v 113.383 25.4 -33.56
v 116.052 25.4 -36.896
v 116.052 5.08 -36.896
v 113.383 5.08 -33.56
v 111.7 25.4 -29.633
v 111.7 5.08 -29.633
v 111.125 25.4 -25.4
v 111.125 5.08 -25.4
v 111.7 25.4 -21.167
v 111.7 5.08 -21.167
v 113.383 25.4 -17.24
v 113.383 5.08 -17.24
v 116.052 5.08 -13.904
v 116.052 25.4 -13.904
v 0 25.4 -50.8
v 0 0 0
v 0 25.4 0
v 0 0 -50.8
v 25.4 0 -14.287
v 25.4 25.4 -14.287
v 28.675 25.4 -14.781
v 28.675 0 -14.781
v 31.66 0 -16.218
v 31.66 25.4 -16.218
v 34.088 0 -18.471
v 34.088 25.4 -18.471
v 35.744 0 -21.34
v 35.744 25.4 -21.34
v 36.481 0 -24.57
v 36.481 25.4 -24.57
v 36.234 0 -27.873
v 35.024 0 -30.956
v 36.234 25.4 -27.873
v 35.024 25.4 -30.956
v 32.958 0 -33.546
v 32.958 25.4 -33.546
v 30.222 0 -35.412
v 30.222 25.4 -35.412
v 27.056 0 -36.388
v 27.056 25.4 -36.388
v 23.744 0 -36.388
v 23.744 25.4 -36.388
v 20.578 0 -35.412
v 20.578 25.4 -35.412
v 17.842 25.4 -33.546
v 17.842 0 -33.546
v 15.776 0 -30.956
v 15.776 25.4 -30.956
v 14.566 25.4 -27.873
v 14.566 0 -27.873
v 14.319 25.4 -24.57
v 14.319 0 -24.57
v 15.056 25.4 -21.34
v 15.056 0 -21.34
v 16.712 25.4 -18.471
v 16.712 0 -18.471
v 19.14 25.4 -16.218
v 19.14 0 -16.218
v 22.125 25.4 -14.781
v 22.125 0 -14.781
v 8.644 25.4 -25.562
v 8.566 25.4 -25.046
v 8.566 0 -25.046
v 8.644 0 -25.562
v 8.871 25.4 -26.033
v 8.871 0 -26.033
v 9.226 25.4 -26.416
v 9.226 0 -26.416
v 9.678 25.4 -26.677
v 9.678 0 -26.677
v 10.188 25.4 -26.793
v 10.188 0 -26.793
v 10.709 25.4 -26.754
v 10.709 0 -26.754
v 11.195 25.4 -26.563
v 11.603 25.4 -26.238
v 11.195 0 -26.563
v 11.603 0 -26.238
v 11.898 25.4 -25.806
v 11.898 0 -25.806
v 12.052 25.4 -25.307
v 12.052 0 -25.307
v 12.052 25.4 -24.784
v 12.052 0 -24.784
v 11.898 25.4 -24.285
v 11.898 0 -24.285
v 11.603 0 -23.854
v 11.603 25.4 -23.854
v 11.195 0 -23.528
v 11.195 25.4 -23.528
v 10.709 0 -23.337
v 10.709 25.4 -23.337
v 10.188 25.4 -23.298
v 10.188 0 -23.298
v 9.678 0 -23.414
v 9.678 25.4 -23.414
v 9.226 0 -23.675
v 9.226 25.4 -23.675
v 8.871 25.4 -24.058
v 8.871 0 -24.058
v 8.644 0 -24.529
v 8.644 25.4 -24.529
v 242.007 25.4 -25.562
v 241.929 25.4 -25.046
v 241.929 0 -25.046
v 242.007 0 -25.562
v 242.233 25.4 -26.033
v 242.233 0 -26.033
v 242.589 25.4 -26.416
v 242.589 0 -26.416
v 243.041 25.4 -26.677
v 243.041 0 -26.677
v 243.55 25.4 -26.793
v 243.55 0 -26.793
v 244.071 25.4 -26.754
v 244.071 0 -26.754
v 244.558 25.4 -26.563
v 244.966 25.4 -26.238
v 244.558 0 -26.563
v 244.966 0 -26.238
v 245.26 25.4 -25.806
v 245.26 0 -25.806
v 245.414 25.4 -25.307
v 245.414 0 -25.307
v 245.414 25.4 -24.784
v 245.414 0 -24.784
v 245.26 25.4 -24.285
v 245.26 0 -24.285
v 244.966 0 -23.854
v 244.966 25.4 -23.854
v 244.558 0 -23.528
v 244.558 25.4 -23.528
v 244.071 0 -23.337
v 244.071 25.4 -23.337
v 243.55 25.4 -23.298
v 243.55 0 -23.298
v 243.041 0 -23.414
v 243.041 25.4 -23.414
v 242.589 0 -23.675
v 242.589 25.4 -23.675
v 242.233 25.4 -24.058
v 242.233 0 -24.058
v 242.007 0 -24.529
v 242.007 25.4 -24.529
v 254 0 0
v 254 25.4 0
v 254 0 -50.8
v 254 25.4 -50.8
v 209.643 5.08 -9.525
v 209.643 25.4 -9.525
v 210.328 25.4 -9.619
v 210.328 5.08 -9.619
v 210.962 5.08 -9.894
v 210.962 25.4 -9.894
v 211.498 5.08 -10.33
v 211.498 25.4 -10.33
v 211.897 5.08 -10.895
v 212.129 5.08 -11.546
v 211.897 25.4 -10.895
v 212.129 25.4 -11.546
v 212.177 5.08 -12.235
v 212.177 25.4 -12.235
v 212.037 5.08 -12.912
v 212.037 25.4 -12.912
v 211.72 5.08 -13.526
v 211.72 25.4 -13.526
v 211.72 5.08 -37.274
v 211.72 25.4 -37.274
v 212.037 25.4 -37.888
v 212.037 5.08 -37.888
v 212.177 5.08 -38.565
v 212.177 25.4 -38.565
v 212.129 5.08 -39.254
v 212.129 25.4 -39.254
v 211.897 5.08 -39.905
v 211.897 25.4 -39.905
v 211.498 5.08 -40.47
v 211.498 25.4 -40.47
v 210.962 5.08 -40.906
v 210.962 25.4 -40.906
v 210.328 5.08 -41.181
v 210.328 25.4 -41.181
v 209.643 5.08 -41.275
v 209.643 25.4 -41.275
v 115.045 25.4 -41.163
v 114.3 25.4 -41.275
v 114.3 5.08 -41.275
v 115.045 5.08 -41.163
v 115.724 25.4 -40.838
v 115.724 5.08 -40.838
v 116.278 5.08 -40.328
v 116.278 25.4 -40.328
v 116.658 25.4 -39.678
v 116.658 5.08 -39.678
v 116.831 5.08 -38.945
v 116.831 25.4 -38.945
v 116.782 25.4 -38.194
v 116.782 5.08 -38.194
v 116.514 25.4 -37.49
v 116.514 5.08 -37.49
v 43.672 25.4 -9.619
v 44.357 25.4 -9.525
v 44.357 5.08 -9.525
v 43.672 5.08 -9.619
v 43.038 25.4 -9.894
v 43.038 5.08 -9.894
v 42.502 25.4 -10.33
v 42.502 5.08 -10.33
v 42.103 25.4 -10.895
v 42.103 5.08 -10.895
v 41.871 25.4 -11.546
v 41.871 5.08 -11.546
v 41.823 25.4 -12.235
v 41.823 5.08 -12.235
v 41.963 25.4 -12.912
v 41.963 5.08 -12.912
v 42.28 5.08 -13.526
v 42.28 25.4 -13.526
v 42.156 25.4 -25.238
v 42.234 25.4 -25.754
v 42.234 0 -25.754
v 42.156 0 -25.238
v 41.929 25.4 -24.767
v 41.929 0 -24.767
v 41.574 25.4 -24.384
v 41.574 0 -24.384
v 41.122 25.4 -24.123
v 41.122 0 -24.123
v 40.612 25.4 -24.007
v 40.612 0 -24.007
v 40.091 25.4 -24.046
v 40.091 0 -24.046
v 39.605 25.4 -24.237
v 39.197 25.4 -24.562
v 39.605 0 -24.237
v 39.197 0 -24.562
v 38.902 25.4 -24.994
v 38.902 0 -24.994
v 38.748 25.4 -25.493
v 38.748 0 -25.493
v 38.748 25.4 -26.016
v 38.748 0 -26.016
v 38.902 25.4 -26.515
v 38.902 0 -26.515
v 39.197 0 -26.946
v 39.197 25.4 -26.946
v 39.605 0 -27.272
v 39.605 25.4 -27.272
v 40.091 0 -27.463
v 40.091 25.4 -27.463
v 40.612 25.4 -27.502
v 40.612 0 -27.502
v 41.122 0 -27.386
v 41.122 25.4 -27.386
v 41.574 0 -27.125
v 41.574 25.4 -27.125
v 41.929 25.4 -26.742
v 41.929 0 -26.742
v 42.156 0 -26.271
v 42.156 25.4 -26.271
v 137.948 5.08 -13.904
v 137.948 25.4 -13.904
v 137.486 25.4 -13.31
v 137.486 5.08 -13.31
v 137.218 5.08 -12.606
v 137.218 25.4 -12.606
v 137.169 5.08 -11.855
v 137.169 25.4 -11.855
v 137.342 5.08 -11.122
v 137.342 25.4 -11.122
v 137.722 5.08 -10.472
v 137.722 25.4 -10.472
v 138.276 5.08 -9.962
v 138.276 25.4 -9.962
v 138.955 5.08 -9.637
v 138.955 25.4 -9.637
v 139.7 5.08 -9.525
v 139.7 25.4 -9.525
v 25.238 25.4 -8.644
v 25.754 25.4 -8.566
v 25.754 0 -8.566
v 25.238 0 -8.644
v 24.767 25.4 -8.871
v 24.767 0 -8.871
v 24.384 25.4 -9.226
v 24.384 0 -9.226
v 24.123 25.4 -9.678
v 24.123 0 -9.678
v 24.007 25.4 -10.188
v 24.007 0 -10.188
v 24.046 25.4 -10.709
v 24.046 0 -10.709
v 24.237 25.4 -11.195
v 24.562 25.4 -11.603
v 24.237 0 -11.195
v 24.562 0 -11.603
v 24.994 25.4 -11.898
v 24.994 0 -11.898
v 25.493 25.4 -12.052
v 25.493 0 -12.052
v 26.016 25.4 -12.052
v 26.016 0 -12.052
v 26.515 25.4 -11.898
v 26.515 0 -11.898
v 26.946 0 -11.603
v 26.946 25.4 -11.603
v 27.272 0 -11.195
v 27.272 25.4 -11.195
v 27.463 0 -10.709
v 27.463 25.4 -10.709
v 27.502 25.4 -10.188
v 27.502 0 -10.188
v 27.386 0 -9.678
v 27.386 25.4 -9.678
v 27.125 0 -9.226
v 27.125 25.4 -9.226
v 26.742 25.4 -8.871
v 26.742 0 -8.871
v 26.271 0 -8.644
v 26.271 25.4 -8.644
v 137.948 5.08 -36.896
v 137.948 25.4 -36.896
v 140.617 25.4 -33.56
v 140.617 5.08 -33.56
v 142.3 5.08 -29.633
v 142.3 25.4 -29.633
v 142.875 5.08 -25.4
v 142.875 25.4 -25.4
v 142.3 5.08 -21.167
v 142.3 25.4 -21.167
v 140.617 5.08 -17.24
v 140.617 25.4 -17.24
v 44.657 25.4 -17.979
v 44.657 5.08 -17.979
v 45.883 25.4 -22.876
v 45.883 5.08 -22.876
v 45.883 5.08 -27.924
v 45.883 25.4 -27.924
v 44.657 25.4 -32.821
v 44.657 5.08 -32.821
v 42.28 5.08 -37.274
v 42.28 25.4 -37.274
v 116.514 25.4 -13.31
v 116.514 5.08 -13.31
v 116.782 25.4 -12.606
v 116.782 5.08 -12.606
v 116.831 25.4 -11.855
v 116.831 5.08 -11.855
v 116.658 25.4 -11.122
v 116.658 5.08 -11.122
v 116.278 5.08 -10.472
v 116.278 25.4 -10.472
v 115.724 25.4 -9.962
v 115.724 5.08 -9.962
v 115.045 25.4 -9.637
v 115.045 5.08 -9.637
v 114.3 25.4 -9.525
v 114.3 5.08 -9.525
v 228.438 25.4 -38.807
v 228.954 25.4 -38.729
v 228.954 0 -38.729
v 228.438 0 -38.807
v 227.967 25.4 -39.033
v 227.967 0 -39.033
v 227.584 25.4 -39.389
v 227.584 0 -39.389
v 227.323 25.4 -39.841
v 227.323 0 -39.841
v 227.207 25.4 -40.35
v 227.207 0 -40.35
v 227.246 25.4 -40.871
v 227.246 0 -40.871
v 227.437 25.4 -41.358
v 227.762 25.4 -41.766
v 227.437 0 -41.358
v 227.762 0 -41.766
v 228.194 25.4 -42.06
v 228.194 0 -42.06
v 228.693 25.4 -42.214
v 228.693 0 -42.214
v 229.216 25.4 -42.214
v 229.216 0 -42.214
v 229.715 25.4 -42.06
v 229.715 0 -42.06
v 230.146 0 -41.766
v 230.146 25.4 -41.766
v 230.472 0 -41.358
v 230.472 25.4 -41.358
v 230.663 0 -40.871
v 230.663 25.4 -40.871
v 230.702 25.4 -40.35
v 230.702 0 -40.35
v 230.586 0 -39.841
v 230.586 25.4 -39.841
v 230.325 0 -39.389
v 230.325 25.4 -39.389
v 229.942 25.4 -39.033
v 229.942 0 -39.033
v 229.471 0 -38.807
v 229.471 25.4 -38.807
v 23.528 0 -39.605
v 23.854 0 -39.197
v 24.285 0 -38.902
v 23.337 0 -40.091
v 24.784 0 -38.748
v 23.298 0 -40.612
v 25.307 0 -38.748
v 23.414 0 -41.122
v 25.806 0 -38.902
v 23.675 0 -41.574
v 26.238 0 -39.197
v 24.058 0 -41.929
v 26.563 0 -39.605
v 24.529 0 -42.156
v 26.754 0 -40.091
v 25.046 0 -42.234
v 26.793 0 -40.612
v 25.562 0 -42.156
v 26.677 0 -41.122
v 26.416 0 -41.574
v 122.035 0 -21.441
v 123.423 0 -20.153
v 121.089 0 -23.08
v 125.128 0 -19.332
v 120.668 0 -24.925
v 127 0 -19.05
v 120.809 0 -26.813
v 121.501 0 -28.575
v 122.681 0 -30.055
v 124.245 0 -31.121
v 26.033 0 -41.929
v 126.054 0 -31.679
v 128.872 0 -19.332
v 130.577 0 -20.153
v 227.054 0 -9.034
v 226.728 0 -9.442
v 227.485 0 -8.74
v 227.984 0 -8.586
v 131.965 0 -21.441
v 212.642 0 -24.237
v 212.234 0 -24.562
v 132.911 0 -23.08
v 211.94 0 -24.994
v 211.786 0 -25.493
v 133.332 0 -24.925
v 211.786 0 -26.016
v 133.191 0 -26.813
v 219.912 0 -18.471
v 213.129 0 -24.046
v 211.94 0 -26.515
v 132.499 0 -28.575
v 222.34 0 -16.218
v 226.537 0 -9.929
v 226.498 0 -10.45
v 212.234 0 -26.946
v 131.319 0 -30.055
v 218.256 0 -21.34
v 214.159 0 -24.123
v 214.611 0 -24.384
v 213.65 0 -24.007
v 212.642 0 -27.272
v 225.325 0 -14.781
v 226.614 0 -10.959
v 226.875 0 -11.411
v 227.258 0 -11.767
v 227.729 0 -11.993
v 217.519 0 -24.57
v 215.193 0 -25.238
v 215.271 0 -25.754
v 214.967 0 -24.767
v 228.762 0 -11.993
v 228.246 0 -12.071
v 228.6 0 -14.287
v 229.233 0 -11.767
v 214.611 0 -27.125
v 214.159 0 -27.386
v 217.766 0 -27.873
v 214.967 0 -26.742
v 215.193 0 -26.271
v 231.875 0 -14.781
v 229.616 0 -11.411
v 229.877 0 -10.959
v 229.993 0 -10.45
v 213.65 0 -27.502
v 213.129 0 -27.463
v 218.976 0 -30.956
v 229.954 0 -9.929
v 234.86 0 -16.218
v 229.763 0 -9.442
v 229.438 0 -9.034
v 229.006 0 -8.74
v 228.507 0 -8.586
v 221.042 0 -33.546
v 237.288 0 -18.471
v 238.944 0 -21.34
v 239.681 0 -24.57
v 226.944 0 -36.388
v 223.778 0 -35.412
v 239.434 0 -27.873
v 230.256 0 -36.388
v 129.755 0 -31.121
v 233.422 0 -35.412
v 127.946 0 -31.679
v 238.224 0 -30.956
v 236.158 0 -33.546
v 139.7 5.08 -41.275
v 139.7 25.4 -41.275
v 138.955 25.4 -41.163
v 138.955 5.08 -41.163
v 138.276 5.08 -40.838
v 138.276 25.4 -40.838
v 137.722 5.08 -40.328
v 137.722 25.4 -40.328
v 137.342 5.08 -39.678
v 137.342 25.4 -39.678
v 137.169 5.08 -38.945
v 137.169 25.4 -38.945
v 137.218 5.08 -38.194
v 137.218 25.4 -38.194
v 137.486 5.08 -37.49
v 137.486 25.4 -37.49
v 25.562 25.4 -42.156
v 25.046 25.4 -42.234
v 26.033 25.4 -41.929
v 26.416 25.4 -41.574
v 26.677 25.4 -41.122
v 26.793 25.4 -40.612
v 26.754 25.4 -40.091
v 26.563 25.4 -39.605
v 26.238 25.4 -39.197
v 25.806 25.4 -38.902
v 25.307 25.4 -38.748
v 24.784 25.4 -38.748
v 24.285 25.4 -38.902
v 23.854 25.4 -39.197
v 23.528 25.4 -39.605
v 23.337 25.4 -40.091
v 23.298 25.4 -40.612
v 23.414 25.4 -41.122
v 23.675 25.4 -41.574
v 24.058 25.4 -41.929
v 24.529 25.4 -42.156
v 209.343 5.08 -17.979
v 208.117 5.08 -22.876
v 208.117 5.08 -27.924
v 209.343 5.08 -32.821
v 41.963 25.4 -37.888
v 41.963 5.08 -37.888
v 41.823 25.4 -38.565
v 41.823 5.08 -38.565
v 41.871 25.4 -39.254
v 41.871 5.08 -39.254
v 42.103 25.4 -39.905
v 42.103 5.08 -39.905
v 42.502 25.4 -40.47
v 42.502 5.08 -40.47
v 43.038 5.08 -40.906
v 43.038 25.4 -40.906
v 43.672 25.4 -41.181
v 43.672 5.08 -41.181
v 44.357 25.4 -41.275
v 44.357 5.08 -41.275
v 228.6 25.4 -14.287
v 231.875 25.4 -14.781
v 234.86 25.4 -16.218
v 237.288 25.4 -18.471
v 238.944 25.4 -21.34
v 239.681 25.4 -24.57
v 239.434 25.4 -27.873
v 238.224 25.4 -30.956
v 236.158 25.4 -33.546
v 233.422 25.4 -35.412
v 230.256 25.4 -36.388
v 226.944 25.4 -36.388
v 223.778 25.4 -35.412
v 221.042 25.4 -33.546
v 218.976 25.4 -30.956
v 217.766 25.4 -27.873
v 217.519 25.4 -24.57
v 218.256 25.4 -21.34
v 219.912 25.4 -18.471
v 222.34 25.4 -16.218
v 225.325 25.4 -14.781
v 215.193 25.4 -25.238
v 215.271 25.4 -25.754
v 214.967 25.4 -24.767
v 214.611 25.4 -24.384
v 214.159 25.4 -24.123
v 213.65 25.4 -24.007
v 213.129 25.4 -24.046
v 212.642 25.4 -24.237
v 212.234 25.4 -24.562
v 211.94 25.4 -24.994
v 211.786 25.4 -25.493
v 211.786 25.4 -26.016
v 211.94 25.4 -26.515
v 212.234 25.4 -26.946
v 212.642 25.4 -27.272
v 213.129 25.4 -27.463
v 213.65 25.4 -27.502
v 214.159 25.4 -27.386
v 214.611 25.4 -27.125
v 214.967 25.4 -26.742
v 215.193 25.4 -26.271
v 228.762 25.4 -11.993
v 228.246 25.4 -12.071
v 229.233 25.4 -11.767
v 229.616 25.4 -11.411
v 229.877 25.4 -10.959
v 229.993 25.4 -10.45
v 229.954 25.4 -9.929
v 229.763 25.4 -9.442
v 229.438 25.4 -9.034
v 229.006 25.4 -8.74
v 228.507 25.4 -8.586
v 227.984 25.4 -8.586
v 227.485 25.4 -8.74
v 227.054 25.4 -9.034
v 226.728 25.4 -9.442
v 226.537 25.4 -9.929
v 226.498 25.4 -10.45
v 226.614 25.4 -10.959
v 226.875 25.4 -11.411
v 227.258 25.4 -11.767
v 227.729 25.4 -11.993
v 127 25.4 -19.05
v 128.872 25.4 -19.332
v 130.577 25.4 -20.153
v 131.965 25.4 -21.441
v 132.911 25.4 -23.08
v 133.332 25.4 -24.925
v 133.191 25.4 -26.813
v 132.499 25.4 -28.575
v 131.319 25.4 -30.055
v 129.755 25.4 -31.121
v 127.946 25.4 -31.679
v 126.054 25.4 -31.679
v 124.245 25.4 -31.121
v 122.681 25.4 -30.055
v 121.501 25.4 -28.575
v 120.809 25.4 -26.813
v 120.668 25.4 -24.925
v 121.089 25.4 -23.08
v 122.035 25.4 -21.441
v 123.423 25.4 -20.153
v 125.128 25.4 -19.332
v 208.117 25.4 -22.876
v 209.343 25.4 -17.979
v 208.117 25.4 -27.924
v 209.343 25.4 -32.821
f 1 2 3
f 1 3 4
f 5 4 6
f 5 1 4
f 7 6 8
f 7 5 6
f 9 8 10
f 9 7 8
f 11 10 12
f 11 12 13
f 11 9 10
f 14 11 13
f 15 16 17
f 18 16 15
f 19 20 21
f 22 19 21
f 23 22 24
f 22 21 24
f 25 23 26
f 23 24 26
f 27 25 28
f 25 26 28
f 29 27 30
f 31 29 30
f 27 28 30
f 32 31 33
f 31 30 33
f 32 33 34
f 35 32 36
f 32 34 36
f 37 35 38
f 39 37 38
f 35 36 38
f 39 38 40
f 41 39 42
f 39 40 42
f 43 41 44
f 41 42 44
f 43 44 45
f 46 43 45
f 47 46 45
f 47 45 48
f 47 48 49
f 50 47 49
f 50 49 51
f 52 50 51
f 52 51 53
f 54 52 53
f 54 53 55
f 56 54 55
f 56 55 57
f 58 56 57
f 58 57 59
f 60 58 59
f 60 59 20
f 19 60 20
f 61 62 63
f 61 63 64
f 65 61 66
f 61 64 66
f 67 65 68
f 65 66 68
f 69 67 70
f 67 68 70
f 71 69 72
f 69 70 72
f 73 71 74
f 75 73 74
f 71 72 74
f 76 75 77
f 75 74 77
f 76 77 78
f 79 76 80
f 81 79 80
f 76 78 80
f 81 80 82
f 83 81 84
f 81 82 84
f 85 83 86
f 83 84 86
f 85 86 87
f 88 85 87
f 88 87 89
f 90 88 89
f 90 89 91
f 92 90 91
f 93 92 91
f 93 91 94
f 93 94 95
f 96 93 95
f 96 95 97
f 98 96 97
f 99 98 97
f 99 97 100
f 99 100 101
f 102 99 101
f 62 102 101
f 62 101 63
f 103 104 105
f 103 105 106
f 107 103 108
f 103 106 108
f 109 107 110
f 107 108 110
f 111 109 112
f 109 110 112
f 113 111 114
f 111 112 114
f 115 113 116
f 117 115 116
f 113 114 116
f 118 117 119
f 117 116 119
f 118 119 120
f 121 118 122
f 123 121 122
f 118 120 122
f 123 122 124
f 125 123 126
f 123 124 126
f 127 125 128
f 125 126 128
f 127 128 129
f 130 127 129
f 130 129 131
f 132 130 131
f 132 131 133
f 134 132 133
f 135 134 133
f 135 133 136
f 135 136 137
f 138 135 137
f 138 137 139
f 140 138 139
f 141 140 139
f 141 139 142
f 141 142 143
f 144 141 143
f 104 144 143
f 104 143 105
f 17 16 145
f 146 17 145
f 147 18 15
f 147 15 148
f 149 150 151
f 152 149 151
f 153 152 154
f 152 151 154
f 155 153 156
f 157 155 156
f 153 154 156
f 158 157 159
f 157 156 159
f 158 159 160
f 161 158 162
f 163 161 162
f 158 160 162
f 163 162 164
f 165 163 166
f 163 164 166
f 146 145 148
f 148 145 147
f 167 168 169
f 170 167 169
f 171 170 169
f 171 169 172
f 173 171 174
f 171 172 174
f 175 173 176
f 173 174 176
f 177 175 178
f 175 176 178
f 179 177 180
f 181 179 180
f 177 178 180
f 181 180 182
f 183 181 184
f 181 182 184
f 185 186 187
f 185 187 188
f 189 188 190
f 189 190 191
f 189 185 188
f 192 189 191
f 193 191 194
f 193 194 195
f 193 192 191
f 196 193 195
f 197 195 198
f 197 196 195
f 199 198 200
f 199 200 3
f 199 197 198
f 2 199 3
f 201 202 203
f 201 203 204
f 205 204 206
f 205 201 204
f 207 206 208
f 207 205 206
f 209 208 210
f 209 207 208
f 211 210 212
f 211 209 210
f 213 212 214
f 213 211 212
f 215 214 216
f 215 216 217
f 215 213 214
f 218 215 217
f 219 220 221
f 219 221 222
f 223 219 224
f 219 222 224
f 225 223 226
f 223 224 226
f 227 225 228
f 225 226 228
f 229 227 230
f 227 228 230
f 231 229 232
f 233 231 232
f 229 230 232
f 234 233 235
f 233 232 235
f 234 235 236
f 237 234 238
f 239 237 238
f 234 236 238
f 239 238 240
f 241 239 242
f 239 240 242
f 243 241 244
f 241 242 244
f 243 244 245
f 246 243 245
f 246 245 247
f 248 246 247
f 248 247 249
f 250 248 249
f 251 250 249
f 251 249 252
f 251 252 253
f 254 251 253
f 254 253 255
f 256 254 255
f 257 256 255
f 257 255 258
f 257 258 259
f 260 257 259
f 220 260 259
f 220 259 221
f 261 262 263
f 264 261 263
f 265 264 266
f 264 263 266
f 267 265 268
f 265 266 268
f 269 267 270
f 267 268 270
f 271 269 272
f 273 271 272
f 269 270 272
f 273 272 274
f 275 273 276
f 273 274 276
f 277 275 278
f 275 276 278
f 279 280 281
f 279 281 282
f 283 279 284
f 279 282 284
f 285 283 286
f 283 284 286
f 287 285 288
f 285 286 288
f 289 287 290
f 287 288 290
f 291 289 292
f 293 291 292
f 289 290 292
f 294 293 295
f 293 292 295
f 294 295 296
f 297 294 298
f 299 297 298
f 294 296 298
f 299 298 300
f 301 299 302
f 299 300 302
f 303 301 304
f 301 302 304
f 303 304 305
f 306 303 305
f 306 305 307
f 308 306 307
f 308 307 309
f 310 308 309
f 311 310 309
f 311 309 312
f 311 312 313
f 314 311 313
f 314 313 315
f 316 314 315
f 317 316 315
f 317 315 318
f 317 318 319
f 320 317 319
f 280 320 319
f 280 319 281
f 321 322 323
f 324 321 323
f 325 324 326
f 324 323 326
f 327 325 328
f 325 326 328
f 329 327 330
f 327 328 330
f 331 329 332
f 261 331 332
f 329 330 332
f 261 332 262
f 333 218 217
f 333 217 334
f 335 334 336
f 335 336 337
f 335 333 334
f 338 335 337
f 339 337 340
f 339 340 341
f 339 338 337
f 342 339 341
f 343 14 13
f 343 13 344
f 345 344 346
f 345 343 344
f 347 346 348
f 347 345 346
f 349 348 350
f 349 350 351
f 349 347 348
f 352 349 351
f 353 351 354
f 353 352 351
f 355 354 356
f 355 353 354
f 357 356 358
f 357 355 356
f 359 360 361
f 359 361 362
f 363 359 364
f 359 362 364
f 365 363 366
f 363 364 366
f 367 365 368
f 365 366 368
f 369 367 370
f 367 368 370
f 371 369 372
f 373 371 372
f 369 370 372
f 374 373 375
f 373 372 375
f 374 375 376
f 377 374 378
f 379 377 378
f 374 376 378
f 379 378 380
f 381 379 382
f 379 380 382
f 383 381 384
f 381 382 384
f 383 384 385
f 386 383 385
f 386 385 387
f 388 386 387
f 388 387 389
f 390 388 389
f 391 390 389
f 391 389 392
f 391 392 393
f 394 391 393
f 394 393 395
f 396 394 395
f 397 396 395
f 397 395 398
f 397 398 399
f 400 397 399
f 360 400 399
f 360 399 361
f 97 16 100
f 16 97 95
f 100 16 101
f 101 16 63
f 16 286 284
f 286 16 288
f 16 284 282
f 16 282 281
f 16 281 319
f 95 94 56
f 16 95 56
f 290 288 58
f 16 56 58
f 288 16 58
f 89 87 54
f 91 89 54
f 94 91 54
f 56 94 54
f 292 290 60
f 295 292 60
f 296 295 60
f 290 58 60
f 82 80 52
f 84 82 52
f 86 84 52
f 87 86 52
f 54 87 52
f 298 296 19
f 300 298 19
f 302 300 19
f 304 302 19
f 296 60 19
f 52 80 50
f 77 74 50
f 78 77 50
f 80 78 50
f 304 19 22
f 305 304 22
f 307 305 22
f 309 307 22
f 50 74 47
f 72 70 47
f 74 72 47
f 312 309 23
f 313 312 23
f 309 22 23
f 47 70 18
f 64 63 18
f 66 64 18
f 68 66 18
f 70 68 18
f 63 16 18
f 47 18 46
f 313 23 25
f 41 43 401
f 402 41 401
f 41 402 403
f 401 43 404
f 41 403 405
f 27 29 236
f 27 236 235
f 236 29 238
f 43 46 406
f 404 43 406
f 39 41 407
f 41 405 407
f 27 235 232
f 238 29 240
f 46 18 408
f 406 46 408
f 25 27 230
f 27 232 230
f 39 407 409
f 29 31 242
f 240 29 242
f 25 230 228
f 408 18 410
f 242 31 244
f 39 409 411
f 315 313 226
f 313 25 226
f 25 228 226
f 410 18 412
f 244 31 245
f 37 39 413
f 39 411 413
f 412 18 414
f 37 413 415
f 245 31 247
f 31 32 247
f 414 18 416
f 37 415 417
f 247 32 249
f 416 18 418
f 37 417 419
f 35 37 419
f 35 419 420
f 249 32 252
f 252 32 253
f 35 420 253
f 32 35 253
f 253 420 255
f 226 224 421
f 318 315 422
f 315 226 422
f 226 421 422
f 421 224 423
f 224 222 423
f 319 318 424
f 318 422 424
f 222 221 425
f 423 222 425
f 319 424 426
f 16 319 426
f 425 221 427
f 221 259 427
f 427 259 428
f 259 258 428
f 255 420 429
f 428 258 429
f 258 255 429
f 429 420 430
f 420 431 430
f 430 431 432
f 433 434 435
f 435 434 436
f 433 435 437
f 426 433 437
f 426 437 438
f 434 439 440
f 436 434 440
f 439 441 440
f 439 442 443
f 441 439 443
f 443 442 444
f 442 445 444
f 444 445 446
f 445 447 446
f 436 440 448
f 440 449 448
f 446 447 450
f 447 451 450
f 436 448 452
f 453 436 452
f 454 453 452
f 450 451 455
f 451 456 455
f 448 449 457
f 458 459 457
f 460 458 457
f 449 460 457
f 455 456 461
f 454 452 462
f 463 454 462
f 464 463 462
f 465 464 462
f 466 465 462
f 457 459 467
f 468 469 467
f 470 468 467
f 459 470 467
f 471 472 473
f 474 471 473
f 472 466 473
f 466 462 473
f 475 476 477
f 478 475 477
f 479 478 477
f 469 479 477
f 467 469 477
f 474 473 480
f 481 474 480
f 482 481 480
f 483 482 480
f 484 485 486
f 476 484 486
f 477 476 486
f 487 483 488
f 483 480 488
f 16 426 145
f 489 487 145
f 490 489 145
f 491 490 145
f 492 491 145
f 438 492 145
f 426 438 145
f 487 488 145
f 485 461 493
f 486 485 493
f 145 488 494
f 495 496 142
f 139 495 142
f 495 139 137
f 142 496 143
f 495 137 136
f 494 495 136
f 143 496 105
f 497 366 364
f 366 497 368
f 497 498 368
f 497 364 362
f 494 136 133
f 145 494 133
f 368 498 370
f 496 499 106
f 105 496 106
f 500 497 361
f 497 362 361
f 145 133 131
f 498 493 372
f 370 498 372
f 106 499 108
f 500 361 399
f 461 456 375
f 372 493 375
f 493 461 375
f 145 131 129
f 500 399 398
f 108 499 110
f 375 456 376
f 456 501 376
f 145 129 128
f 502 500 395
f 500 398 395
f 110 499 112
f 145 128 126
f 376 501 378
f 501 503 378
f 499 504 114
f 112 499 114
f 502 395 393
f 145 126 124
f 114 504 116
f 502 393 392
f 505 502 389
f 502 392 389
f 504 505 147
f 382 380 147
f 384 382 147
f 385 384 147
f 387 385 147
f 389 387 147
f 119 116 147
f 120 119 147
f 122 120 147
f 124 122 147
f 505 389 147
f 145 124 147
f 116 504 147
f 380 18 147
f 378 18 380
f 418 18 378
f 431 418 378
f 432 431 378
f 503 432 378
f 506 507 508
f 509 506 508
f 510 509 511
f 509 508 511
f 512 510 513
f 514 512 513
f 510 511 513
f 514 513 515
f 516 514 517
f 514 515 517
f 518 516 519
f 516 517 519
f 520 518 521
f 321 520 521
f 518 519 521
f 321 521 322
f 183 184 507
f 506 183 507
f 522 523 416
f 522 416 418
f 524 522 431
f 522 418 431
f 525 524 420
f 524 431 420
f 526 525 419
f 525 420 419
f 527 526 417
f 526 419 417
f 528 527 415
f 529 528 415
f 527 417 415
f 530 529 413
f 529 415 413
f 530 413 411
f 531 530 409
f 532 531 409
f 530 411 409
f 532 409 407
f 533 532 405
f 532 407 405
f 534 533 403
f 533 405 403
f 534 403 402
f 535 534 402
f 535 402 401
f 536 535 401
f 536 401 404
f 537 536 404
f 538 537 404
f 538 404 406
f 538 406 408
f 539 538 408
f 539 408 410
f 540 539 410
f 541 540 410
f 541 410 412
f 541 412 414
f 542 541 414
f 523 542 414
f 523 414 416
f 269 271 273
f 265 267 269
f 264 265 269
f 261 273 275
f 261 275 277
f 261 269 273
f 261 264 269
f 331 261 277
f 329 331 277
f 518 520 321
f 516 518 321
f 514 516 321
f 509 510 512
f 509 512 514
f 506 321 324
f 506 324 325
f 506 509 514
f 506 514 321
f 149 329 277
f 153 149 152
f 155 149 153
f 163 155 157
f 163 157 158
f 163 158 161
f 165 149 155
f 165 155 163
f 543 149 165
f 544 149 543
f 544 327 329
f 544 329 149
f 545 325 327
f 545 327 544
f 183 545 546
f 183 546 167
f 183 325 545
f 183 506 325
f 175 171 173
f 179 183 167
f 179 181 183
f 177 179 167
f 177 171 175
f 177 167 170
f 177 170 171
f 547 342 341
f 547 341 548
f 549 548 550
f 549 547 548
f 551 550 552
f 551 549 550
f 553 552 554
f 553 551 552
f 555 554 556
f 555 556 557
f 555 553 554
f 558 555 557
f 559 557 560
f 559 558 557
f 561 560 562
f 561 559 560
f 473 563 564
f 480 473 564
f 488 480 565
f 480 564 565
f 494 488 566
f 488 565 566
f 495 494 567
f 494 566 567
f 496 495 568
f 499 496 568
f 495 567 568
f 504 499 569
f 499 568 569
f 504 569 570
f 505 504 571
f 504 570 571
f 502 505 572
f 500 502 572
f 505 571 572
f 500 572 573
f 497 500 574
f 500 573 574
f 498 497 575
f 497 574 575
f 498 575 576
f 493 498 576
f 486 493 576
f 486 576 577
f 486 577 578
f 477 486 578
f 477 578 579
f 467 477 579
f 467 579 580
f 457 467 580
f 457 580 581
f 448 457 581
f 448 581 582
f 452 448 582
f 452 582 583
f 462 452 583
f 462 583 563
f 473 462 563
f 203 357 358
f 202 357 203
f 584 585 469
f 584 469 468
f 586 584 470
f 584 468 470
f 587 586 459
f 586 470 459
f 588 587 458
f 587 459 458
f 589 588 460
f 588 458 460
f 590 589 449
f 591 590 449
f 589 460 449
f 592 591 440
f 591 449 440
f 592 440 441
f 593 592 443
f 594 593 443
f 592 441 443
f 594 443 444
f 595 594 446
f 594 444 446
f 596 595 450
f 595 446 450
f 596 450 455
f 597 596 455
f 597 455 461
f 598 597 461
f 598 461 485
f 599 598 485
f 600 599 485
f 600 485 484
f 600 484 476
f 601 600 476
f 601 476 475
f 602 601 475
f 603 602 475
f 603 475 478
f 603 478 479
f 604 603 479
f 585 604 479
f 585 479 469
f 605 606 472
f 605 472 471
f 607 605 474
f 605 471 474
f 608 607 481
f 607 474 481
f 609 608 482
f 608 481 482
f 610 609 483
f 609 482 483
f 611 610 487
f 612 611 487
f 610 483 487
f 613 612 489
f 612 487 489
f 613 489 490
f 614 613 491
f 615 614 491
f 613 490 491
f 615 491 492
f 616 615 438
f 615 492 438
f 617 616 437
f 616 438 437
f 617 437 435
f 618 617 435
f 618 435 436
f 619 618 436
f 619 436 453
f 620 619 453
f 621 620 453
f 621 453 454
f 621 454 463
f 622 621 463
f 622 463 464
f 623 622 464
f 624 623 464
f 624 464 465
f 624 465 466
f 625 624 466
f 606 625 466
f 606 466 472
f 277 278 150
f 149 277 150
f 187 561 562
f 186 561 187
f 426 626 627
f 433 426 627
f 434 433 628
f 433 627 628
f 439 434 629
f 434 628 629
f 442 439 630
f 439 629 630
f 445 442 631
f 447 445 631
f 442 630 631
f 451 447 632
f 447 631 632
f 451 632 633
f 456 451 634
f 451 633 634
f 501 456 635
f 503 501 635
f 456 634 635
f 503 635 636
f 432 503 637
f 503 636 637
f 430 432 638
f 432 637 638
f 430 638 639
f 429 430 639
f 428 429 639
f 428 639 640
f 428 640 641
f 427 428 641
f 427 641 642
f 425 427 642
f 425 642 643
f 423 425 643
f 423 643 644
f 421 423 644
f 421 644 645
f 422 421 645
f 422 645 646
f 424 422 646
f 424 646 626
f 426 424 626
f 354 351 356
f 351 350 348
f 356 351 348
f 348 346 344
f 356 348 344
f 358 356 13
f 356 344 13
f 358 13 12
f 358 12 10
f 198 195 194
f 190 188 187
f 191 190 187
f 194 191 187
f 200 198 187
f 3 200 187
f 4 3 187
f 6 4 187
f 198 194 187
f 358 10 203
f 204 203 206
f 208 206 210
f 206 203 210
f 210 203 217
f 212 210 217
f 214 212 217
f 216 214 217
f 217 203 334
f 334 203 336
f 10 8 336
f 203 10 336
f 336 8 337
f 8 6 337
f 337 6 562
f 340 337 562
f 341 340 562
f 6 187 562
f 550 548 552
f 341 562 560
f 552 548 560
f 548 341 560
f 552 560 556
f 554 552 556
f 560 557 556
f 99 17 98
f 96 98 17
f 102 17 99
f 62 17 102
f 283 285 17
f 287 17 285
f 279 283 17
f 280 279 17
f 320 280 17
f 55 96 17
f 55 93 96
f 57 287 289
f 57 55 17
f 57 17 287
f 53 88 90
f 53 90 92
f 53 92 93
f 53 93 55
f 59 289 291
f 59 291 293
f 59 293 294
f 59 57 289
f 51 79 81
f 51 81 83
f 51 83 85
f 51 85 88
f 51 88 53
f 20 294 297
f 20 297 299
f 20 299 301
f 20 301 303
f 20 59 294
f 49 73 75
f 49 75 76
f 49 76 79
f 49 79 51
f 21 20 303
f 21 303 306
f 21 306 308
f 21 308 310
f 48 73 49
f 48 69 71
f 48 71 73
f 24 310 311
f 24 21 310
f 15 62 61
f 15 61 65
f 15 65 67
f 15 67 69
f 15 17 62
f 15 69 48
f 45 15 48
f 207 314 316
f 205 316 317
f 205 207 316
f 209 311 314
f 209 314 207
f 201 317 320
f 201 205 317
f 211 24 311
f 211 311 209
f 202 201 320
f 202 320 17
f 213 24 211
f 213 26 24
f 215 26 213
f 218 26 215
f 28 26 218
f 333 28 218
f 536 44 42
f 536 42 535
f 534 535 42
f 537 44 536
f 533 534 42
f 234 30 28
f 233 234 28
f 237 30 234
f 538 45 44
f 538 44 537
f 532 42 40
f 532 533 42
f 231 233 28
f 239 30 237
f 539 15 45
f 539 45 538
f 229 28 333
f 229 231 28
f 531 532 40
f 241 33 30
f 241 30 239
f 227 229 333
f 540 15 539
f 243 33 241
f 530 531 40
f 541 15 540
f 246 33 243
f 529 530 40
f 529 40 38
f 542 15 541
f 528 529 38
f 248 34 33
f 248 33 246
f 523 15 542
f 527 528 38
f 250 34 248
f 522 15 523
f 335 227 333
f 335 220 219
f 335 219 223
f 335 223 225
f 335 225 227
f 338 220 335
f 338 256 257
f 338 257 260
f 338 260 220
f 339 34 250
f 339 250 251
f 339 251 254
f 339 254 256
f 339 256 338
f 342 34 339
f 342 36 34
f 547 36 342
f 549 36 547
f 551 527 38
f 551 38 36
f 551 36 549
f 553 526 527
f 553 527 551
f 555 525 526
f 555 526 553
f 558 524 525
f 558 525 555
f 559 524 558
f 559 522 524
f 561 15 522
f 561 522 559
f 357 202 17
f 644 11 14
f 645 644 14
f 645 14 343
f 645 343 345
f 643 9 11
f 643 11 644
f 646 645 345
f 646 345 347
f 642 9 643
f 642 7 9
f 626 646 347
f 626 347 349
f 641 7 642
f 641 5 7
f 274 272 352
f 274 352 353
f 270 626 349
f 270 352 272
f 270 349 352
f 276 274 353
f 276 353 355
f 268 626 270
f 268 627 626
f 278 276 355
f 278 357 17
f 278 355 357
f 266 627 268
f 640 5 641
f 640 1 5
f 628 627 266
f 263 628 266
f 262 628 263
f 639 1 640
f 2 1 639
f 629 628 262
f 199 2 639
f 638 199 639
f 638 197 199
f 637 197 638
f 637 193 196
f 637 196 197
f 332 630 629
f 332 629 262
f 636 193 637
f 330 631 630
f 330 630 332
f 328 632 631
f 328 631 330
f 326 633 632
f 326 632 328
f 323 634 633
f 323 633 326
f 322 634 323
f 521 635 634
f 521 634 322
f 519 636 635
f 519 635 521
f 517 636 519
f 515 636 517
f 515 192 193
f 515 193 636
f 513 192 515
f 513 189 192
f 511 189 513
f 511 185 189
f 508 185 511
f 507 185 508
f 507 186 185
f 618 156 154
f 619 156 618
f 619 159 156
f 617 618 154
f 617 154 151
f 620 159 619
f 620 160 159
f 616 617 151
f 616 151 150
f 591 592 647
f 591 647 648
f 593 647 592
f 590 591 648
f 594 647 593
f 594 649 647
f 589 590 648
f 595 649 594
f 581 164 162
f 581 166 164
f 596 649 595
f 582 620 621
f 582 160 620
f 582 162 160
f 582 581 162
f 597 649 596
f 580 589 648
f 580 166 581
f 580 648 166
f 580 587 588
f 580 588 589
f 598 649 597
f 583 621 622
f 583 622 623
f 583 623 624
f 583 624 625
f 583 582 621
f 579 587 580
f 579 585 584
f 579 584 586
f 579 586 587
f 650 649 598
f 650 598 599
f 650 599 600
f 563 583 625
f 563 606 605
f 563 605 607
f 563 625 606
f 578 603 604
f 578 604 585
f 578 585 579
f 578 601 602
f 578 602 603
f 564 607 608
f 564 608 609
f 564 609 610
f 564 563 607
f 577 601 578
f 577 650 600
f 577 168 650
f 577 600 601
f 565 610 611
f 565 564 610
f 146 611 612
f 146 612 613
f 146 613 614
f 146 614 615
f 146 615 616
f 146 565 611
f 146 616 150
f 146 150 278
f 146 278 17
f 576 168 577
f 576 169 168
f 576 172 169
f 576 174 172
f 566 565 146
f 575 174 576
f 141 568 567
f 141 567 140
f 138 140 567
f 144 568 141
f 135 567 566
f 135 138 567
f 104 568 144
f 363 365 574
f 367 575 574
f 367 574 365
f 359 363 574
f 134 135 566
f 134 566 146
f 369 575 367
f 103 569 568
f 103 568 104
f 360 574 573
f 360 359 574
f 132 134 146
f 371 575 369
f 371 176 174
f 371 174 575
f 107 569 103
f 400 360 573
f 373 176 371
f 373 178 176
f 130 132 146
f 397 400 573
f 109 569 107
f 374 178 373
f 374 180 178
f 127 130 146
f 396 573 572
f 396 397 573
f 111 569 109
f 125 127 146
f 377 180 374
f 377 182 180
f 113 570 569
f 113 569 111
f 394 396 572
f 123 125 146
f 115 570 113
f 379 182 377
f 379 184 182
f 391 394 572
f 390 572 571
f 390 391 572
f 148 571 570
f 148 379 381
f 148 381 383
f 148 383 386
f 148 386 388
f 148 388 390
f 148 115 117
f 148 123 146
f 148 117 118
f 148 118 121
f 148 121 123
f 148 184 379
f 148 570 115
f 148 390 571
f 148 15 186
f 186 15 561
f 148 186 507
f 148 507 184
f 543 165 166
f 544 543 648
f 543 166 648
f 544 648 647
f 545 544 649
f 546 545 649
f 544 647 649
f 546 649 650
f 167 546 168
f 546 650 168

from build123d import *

# Parameters (mm, degrees)
SKETCH2_W             = 254
SKETCH2_H             = 50.8
BOSS_EXTRUDE1_DEPTH   = 25.4
SKETCH3_R             = 11.1125
SKETCH3_R_2           = 6.35
CUT_EXTRUDE1_DEPTH    = 261.272549455
F_6_32_TAPPED_HOLE1_D = 3.5052
CUT_EXTRUDE3_DEPTH    = 20.32
CIRPATTERN1_COUNT     = 4
CIRPATTERN2_COUNT     = 4


with BuildPart() as part:
    # Sketch2 → Boss-Extrude1 (new body)
    with BuildSketch(Plane(origin=(0, 0, 0), x_dir=(1, 0, 0), z_dir=(0, 1, 0))):
        with Locations((127, 25.4)):
            Rectangle(SKETCH2_W, SKETCH2_H)
    extrude(amount=BOSS_EXTRUDE1_DEPTH)

    # Sketch3 → Cut-Extrude1 (cut, through all)
    with BuildSketch(Plane(origin=(0, 25.4, 0), x_dir=(1, 0, 0), z_dir=(0, 1, 0))):
        with Locations(Location((25.4, 25.4, 0), (0, 0, 270))):
            Circle(SKETCH3_R)
        with Locations(Location((228.6, 25.4, 0), (0, 0, 270))):
            Circle(SKETCH3_R)
        with Locations(Location((127, 25.4, 0), (0, 0, 270))):
            Circle(SKETCH3_R_2)
    extrude(amount=-CUT_EXTRUDE1_DEPTH, mode=Mode.SUBTRACT)

    # #6-32 Tapped Hole1 (through all)
    with Locations(Plane(origin=(0, 25.4, 0), x_dir=(1, 0, 0), z_dir=(0, 1, 0))):
        with Locations((10.31875, 25.045657608), (243.68125, 25.045657608)):
            f_6_32_tapped_hole1 = Hole(F_6_32_TAPPED_HOLE1_D / 2)

    # Sketch6 → Cut-Extrude3 (cut)
    with BuildSketch(Plane(origin=(0, 25.4, 0), x_dir=(1, 0, 0), z_dir=(0, 1, 0))):
        with BuildLine():
            Line((44.357169653, 41.275), (114.3, 41.275))
            ThreePointArc((114.3, 41.275), (116.658330795, 39.678332318), (116.051724138, 36.895689655))
            ThreePointArc((116.051724138, 36.895689655), (111.125, 25.4), (116.051724138, 13.904310345))
            ThreePointArc((116.051724138, 13.904310345), (116.658330795, 11.121667682), (114.3, 9.525))
            Line((114.3, 9.525), (44.357169653, 9.525))
            ThreePointArc((44.357169653, 9.525), (42.102898213, 10.894589698), (42.279671609, 13.526369863))
            ThreePointArc((42.279671609, 13.526369863), (46.0375, 25.4), (42.279671609, 37.273630137))
            ThreePointArc((42.279671609, 37.273630137), (42.102898213, 39.905410302), (44.357169653, 41.275))
        make_face()
        with BuildLine():
            Line((209.642830347, 41.275), (139.7, 41.275))
            ThreePointArc((139.7, 41.275), (137.341669205, 39.678332318), (137.948275862, 36.895689655))
            ThreePointArc((137.948275862, 36.895689655), (142.875, 25.4), (137.948275862, 13.904310345))
            ThreePointArc((137.948275862, 13.904310345), (137.341669205, 11.121667682), (139.7, 9.525))
            Line((139.7, 9.525), (209.642830347, 9.525))
            ThreePointArc((209.642830347, 9.525), (211.897101787, 10.894589698), (211.720328391, 13.526369863))
            ThreePointArc((211.720328391, 13.526369863), (207.9625, 25.4), (211.720328391, 37.273630137))
            ThreePointArc((211.720328391, 37.273630137), (211.897101787, 39.905410302), (209.642830347, 41.275))
        make_face()
    extrude(amount=-CUT_EXTRUDE3_DEPTH, mode=Mode.SUBTRACT)

    # CirPattern1: #6-32 Tapped Hole1 ×4 about axis
    cirpattern1_axis = Axis((25.4, 0, -25.4), (0, 1, 0))
    for i in range(1, CIRPATTERN1_COUNT):
        add(f_6_32_tapped_hole1.rotate(cirpattern1_axis, i * 360 / CIRPATTERN1_COUNT), mode=Mode.SUBTRACT)

    # CirPattern2: #6-32 Tapped Hole1 ×4 about axis
    cirpattern2_axis = Axis((228.6, 0, -25.4), (0, 1, 0))
    for i in range(1, CIRPATTERN2_COUNT):
        add(f_6_32_tapped_hole1.rotate(cirpattern2_axis, i * 360 / CIRPATTERN2_COUNT), mode=Mode.SUBTRACT)


solid = part.part
